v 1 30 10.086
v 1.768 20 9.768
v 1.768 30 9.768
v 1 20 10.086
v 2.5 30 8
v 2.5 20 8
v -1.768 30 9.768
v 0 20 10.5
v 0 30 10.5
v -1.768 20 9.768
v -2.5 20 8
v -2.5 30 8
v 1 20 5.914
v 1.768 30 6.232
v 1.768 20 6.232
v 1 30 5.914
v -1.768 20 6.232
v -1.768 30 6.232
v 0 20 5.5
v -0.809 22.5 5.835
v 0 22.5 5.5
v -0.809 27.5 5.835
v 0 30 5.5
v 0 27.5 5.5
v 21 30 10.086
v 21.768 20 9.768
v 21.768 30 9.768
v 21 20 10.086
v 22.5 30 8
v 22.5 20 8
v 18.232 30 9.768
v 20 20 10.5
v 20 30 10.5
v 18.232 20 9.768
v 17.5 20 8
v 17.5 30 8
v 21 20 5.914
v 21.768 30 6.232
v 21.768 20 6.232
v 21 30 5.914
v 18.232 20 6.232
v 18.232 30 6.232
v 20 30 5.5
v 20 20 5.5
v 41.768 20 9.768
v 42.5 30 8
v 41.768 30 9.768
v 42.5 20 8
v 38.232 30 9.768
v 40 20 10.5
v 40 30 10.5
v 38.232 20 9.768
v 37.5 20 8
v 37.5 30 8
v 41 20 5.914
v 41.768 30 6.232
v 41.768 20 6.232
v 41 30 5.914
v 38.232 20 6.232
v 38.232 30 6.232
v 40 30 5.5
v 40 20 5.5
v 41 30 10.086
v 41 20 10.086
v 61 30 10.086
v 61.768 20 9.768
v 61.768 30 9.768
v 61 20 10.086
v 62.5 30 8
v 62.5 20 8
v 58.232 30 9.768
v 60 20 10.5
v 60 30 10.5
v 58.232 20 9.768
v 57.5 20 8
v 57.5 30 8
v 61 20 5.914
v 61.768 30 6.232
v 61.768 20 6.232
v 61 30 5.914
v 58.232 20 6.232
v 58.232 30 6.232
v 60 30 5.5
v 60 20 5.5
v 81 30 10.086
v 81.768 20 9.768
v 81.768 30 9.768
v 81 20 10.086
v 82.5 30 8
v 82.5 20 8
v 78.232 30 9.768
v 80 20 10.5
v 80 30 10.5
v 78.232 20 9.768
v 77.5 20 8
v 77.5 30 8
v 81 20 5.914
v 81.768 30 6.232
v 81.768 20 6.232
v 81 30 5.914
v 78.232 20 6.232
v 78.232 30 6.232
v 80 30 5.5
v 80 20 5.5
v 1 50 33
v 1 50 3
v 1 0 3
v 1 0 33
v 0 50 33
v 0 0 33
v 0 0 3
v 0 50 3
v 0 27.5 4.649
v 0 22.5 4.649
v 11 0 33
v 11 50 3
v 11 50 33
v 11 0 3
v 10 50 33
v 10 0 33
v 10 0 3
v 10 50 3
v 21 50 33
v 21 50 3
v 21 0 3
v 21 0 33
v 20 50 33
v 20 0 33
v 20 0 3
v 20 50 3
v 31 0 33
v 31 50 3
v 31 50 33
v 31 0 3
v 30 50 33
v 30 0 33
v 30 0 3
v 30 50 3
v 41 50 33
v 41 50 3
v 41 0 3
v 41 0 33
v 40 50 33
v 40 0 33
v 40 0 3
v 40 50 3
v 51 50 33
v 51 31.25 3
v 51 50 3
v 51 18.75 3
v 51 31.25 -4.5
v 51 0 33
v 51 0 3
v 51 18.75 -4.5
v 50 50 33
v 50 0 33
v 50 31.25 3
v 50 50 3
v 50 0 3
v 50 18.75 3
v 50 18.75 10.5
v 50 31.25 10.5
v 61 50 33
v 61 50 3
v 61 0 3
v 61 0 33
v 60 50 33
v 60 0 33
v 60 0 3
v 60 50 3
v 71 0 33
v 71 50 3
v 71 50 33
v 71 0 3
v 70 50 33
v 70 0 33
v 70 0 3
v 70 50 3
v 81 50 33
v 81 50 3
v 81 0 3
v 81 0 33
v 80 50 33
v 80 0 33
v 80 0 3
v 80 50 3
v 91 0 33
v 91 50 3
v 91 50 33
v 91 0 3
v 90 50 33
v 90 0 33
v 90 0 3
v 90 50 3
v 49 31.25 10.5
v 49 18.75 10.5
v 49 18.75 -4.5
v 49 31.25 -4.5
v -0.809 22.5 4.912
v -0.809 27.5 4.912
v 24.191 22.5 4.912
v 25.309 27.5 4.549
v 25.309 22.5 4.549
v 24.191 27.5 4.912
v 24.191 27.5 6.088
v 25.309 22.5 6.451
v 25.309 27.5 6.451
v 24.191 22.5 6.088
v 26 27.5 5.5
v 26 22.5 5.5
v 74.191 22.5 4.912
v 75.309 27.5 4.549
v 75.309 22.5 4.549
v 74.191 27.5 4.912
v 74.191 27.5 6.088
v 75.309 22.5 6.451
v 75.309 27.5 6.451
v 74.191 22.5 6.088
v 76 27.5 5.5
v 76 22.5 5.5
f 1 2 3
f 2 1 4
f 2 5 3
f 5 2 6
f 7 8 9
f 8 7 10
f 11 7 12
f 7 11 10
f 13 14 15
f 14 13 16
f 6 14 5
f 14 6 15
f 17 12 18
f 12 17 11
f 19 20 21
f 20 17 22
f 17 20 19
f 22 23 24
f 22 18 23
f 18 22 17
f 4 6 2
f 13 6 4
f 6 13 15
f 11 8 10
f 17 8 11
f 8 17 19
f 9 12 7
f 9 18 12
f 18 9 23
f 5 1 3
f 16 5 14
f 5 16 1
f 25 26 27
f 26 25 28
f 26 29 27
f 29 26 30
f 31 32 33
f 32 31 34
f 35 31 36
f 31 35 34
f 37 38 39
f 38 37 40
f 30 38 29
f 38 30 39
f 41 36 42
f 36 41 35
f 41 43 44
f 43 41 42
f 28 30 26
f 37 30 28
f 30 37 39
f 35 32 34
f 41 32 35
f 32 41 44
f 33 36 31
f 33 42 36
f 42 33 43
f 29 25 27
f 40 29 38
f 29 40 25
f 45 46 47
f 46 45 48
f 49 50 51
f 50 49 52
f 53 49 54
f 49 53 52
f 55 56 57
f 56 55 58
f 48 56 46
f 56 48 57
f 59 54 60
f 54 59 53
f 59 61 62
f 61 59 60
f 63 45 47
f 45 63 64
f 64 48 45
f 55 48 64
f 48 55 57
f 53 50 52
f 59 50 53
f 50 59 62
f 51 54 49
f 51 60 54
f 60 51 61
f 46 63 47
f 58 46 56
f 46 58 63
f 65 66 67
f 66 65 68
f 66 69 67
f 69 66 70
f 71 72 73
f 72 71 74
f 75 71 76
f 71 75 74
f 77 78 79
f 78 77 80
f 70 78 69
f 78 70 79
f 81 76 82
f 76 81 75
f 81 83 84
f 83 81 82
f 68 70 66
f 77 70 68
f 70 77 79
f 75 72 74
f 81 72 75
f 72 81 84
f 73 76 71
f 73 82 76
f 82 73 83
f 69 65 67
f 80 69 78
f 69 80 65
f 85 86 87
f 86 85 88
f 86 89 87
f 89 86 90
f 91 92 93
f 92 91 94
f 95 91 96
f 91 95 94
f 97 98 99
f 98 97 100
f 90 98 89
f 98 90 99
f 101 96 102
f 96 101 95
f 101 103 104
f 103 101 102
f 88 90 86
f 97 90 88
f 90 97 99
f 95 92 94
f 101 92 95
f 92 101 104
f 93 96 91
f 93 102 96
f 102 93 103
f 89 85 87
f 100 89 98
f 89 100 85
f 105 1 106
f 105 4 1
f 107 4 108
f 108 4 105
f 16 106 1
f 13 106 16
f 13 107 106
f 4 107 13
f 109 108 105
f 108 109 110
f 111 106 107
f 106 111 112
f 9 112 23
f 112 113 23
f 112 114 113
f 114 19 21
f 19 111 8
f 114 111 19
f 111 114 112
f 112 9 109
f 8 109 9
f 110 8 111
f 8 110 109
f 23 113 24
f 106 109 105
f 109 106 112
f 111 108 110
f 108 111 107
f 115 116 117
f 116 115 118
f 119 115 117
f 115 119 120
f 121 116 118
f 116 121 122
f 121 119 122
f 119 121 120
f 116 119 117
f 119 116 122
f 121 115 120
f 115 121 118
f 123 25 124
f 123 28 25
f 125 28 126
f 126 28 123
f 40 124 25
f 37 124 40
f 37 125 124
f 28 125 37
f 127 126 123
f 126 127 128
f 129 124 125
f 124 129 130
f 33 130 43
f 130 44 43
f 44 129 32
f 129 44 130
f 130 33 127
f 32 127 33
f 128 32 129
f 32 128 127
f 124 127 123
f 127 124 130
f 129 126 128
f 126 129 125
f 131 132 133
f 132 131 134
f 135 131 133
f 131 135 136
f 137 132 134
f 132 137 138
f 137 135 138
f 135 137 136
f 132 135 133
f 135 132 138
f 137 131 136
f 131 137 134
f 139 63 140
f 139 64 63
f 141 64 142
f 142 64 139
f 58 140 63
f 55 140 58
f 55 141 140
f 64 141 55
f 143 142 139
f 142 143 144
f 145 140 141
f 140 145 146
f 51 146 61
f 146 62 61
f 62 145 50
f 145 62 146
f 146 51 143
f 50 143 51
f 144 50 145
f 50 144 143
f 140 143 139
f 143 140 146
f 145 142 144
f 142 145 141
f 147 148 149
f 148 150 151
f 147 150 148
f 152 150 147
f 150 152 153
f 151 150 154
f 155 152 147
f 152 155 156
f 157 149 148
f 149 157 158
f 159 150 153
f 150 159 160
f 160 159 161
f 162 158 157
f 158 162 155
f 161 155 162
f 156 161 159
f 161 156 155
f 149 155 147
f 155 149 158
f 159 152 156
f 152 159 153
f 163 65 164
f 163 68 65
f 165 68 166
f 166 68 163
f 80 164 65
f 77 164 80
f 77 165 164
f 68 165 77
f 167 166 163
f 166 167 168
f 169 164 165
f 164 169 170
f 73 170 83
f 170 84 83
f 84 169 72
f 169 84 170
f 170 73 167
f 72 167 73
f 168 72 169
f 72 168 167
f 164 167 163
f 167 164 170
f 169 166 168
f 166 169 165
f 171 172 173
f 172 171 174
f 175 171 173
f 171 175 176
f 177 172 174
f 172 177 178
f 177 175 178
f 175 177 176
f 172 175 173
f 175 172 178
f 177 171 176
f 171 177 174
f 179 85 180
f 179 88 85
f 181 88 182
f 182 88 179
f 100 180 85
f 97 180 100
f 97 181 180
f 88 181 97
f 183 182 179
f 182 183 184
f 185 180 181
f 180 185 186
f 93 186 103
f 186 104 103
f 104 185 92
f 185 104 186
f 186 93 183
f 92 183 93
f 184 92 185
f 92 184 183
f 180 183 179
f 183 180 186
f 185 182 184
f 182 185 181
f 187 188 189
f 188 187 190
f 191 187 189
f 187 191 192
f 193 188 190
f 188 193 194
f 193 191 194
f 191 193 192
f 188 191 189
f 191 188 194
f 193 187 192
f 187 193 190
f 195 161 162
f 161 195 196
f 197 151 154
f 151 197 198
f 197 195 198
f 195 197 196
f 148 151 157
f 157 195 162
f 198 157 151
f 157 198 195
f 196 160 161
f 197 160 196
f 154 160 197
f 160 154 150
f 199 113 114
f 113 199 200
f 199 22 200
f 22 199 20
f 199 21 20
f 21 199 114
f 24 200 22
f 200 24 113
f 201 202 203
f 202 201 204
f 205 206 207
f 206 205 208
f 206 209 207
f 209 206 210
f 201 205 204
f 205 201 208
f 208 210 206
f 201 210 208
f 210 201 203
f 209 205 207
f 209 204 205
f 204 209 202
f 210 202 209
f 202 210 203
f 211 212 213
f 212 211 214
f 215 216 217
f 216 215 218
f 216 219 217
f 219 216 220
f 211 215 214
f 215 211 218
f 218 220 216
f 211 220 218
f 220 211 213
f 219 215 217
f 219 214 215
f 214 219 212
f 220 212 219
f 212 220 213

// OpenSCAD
union() {
    // First section with cylinders
    translate([0, 25, 8]) {
        rotate([90, 0, 0]) {
            cylinder(center = true, h = 10, r = 2.5);
        }
    }
    translate([20, 25, 8]) {
        rotate([90, 0, 0]) {
            cylinder(center = true, h = 10, r = 2.5);
        }
    }
    translate([40, 25, 8]) {
        rotate([90, 0, 0]) {
            cylinder(center = true, h = 10, r = 2.5);
        }
    }
    translate([60, 25, 8]) {
        rotate([90, 0, 0]) {
            cylinder(center = true, h = 10, r = 2.5);
        }
    }
    translate([80, 25, 8]) {
        rotate([90, 0, 0]) {
            cylinder(center = true, h = 10, r = 2.5);
        }
    }

    // Second section with cubes
    translate([0, 0, 3]) {
        cube([1, 50, 30], center = false);
    }
    translate([10, 0, 3]) {
        cube([1, 50, 30], center = false);
    }
    translate([20, 0, 3]) {
        cube([1, 50, 30], center = false);
    }
    translate([30, 0, 3]) {
        cube([1, 50, 30], center = false);
    }
    translate([40, 0, 3]) {
        cube([1, 50, 30], center = false);
    }
    translate([50, 0, 3]) {
        cube([1, 50, 30], center = false);
    }
    translate([60, 0, 3]) {
        cube([1, 50, 30], center = false);
    }
    translate([70, 0, 3]) {
        cube([1, 50, 30], center = false);
    }
    translate([80, 0, 3]) {
        cube([1, 50, 30], center = false);
    }
    translate([90, 0, 3]) {
        cube([1, 50, 30], center = false);
    }

    // Centered cube
    translate([50, 25, 3]) {
        cube([2, 12.5, 15], center = true);
    }

    // Additional cylinders
    translate([0, 25, 5.5]) {
        rotate([90, 0, 0]) {
            cylinder(center = true, h = 5, r = 1.0);
        }
    }
    translate([25, 25, 5.5]) {
        rotate([90, 0, 0]) {
            cylinder(center = true, h = 5, r = 1.0);
        }
    }
    translate([50, 25, 5.5]) {
        rotate([90, 0, 0]) {
            cylinder(center = true, h = 5, r = 1.0);
        }
    }
    translate([75, 25, 5.5]) {
        rotate([90, 0, 0]) {
            cylinder(center = true, h = 5, r = 1.0);
        }
    }
}
